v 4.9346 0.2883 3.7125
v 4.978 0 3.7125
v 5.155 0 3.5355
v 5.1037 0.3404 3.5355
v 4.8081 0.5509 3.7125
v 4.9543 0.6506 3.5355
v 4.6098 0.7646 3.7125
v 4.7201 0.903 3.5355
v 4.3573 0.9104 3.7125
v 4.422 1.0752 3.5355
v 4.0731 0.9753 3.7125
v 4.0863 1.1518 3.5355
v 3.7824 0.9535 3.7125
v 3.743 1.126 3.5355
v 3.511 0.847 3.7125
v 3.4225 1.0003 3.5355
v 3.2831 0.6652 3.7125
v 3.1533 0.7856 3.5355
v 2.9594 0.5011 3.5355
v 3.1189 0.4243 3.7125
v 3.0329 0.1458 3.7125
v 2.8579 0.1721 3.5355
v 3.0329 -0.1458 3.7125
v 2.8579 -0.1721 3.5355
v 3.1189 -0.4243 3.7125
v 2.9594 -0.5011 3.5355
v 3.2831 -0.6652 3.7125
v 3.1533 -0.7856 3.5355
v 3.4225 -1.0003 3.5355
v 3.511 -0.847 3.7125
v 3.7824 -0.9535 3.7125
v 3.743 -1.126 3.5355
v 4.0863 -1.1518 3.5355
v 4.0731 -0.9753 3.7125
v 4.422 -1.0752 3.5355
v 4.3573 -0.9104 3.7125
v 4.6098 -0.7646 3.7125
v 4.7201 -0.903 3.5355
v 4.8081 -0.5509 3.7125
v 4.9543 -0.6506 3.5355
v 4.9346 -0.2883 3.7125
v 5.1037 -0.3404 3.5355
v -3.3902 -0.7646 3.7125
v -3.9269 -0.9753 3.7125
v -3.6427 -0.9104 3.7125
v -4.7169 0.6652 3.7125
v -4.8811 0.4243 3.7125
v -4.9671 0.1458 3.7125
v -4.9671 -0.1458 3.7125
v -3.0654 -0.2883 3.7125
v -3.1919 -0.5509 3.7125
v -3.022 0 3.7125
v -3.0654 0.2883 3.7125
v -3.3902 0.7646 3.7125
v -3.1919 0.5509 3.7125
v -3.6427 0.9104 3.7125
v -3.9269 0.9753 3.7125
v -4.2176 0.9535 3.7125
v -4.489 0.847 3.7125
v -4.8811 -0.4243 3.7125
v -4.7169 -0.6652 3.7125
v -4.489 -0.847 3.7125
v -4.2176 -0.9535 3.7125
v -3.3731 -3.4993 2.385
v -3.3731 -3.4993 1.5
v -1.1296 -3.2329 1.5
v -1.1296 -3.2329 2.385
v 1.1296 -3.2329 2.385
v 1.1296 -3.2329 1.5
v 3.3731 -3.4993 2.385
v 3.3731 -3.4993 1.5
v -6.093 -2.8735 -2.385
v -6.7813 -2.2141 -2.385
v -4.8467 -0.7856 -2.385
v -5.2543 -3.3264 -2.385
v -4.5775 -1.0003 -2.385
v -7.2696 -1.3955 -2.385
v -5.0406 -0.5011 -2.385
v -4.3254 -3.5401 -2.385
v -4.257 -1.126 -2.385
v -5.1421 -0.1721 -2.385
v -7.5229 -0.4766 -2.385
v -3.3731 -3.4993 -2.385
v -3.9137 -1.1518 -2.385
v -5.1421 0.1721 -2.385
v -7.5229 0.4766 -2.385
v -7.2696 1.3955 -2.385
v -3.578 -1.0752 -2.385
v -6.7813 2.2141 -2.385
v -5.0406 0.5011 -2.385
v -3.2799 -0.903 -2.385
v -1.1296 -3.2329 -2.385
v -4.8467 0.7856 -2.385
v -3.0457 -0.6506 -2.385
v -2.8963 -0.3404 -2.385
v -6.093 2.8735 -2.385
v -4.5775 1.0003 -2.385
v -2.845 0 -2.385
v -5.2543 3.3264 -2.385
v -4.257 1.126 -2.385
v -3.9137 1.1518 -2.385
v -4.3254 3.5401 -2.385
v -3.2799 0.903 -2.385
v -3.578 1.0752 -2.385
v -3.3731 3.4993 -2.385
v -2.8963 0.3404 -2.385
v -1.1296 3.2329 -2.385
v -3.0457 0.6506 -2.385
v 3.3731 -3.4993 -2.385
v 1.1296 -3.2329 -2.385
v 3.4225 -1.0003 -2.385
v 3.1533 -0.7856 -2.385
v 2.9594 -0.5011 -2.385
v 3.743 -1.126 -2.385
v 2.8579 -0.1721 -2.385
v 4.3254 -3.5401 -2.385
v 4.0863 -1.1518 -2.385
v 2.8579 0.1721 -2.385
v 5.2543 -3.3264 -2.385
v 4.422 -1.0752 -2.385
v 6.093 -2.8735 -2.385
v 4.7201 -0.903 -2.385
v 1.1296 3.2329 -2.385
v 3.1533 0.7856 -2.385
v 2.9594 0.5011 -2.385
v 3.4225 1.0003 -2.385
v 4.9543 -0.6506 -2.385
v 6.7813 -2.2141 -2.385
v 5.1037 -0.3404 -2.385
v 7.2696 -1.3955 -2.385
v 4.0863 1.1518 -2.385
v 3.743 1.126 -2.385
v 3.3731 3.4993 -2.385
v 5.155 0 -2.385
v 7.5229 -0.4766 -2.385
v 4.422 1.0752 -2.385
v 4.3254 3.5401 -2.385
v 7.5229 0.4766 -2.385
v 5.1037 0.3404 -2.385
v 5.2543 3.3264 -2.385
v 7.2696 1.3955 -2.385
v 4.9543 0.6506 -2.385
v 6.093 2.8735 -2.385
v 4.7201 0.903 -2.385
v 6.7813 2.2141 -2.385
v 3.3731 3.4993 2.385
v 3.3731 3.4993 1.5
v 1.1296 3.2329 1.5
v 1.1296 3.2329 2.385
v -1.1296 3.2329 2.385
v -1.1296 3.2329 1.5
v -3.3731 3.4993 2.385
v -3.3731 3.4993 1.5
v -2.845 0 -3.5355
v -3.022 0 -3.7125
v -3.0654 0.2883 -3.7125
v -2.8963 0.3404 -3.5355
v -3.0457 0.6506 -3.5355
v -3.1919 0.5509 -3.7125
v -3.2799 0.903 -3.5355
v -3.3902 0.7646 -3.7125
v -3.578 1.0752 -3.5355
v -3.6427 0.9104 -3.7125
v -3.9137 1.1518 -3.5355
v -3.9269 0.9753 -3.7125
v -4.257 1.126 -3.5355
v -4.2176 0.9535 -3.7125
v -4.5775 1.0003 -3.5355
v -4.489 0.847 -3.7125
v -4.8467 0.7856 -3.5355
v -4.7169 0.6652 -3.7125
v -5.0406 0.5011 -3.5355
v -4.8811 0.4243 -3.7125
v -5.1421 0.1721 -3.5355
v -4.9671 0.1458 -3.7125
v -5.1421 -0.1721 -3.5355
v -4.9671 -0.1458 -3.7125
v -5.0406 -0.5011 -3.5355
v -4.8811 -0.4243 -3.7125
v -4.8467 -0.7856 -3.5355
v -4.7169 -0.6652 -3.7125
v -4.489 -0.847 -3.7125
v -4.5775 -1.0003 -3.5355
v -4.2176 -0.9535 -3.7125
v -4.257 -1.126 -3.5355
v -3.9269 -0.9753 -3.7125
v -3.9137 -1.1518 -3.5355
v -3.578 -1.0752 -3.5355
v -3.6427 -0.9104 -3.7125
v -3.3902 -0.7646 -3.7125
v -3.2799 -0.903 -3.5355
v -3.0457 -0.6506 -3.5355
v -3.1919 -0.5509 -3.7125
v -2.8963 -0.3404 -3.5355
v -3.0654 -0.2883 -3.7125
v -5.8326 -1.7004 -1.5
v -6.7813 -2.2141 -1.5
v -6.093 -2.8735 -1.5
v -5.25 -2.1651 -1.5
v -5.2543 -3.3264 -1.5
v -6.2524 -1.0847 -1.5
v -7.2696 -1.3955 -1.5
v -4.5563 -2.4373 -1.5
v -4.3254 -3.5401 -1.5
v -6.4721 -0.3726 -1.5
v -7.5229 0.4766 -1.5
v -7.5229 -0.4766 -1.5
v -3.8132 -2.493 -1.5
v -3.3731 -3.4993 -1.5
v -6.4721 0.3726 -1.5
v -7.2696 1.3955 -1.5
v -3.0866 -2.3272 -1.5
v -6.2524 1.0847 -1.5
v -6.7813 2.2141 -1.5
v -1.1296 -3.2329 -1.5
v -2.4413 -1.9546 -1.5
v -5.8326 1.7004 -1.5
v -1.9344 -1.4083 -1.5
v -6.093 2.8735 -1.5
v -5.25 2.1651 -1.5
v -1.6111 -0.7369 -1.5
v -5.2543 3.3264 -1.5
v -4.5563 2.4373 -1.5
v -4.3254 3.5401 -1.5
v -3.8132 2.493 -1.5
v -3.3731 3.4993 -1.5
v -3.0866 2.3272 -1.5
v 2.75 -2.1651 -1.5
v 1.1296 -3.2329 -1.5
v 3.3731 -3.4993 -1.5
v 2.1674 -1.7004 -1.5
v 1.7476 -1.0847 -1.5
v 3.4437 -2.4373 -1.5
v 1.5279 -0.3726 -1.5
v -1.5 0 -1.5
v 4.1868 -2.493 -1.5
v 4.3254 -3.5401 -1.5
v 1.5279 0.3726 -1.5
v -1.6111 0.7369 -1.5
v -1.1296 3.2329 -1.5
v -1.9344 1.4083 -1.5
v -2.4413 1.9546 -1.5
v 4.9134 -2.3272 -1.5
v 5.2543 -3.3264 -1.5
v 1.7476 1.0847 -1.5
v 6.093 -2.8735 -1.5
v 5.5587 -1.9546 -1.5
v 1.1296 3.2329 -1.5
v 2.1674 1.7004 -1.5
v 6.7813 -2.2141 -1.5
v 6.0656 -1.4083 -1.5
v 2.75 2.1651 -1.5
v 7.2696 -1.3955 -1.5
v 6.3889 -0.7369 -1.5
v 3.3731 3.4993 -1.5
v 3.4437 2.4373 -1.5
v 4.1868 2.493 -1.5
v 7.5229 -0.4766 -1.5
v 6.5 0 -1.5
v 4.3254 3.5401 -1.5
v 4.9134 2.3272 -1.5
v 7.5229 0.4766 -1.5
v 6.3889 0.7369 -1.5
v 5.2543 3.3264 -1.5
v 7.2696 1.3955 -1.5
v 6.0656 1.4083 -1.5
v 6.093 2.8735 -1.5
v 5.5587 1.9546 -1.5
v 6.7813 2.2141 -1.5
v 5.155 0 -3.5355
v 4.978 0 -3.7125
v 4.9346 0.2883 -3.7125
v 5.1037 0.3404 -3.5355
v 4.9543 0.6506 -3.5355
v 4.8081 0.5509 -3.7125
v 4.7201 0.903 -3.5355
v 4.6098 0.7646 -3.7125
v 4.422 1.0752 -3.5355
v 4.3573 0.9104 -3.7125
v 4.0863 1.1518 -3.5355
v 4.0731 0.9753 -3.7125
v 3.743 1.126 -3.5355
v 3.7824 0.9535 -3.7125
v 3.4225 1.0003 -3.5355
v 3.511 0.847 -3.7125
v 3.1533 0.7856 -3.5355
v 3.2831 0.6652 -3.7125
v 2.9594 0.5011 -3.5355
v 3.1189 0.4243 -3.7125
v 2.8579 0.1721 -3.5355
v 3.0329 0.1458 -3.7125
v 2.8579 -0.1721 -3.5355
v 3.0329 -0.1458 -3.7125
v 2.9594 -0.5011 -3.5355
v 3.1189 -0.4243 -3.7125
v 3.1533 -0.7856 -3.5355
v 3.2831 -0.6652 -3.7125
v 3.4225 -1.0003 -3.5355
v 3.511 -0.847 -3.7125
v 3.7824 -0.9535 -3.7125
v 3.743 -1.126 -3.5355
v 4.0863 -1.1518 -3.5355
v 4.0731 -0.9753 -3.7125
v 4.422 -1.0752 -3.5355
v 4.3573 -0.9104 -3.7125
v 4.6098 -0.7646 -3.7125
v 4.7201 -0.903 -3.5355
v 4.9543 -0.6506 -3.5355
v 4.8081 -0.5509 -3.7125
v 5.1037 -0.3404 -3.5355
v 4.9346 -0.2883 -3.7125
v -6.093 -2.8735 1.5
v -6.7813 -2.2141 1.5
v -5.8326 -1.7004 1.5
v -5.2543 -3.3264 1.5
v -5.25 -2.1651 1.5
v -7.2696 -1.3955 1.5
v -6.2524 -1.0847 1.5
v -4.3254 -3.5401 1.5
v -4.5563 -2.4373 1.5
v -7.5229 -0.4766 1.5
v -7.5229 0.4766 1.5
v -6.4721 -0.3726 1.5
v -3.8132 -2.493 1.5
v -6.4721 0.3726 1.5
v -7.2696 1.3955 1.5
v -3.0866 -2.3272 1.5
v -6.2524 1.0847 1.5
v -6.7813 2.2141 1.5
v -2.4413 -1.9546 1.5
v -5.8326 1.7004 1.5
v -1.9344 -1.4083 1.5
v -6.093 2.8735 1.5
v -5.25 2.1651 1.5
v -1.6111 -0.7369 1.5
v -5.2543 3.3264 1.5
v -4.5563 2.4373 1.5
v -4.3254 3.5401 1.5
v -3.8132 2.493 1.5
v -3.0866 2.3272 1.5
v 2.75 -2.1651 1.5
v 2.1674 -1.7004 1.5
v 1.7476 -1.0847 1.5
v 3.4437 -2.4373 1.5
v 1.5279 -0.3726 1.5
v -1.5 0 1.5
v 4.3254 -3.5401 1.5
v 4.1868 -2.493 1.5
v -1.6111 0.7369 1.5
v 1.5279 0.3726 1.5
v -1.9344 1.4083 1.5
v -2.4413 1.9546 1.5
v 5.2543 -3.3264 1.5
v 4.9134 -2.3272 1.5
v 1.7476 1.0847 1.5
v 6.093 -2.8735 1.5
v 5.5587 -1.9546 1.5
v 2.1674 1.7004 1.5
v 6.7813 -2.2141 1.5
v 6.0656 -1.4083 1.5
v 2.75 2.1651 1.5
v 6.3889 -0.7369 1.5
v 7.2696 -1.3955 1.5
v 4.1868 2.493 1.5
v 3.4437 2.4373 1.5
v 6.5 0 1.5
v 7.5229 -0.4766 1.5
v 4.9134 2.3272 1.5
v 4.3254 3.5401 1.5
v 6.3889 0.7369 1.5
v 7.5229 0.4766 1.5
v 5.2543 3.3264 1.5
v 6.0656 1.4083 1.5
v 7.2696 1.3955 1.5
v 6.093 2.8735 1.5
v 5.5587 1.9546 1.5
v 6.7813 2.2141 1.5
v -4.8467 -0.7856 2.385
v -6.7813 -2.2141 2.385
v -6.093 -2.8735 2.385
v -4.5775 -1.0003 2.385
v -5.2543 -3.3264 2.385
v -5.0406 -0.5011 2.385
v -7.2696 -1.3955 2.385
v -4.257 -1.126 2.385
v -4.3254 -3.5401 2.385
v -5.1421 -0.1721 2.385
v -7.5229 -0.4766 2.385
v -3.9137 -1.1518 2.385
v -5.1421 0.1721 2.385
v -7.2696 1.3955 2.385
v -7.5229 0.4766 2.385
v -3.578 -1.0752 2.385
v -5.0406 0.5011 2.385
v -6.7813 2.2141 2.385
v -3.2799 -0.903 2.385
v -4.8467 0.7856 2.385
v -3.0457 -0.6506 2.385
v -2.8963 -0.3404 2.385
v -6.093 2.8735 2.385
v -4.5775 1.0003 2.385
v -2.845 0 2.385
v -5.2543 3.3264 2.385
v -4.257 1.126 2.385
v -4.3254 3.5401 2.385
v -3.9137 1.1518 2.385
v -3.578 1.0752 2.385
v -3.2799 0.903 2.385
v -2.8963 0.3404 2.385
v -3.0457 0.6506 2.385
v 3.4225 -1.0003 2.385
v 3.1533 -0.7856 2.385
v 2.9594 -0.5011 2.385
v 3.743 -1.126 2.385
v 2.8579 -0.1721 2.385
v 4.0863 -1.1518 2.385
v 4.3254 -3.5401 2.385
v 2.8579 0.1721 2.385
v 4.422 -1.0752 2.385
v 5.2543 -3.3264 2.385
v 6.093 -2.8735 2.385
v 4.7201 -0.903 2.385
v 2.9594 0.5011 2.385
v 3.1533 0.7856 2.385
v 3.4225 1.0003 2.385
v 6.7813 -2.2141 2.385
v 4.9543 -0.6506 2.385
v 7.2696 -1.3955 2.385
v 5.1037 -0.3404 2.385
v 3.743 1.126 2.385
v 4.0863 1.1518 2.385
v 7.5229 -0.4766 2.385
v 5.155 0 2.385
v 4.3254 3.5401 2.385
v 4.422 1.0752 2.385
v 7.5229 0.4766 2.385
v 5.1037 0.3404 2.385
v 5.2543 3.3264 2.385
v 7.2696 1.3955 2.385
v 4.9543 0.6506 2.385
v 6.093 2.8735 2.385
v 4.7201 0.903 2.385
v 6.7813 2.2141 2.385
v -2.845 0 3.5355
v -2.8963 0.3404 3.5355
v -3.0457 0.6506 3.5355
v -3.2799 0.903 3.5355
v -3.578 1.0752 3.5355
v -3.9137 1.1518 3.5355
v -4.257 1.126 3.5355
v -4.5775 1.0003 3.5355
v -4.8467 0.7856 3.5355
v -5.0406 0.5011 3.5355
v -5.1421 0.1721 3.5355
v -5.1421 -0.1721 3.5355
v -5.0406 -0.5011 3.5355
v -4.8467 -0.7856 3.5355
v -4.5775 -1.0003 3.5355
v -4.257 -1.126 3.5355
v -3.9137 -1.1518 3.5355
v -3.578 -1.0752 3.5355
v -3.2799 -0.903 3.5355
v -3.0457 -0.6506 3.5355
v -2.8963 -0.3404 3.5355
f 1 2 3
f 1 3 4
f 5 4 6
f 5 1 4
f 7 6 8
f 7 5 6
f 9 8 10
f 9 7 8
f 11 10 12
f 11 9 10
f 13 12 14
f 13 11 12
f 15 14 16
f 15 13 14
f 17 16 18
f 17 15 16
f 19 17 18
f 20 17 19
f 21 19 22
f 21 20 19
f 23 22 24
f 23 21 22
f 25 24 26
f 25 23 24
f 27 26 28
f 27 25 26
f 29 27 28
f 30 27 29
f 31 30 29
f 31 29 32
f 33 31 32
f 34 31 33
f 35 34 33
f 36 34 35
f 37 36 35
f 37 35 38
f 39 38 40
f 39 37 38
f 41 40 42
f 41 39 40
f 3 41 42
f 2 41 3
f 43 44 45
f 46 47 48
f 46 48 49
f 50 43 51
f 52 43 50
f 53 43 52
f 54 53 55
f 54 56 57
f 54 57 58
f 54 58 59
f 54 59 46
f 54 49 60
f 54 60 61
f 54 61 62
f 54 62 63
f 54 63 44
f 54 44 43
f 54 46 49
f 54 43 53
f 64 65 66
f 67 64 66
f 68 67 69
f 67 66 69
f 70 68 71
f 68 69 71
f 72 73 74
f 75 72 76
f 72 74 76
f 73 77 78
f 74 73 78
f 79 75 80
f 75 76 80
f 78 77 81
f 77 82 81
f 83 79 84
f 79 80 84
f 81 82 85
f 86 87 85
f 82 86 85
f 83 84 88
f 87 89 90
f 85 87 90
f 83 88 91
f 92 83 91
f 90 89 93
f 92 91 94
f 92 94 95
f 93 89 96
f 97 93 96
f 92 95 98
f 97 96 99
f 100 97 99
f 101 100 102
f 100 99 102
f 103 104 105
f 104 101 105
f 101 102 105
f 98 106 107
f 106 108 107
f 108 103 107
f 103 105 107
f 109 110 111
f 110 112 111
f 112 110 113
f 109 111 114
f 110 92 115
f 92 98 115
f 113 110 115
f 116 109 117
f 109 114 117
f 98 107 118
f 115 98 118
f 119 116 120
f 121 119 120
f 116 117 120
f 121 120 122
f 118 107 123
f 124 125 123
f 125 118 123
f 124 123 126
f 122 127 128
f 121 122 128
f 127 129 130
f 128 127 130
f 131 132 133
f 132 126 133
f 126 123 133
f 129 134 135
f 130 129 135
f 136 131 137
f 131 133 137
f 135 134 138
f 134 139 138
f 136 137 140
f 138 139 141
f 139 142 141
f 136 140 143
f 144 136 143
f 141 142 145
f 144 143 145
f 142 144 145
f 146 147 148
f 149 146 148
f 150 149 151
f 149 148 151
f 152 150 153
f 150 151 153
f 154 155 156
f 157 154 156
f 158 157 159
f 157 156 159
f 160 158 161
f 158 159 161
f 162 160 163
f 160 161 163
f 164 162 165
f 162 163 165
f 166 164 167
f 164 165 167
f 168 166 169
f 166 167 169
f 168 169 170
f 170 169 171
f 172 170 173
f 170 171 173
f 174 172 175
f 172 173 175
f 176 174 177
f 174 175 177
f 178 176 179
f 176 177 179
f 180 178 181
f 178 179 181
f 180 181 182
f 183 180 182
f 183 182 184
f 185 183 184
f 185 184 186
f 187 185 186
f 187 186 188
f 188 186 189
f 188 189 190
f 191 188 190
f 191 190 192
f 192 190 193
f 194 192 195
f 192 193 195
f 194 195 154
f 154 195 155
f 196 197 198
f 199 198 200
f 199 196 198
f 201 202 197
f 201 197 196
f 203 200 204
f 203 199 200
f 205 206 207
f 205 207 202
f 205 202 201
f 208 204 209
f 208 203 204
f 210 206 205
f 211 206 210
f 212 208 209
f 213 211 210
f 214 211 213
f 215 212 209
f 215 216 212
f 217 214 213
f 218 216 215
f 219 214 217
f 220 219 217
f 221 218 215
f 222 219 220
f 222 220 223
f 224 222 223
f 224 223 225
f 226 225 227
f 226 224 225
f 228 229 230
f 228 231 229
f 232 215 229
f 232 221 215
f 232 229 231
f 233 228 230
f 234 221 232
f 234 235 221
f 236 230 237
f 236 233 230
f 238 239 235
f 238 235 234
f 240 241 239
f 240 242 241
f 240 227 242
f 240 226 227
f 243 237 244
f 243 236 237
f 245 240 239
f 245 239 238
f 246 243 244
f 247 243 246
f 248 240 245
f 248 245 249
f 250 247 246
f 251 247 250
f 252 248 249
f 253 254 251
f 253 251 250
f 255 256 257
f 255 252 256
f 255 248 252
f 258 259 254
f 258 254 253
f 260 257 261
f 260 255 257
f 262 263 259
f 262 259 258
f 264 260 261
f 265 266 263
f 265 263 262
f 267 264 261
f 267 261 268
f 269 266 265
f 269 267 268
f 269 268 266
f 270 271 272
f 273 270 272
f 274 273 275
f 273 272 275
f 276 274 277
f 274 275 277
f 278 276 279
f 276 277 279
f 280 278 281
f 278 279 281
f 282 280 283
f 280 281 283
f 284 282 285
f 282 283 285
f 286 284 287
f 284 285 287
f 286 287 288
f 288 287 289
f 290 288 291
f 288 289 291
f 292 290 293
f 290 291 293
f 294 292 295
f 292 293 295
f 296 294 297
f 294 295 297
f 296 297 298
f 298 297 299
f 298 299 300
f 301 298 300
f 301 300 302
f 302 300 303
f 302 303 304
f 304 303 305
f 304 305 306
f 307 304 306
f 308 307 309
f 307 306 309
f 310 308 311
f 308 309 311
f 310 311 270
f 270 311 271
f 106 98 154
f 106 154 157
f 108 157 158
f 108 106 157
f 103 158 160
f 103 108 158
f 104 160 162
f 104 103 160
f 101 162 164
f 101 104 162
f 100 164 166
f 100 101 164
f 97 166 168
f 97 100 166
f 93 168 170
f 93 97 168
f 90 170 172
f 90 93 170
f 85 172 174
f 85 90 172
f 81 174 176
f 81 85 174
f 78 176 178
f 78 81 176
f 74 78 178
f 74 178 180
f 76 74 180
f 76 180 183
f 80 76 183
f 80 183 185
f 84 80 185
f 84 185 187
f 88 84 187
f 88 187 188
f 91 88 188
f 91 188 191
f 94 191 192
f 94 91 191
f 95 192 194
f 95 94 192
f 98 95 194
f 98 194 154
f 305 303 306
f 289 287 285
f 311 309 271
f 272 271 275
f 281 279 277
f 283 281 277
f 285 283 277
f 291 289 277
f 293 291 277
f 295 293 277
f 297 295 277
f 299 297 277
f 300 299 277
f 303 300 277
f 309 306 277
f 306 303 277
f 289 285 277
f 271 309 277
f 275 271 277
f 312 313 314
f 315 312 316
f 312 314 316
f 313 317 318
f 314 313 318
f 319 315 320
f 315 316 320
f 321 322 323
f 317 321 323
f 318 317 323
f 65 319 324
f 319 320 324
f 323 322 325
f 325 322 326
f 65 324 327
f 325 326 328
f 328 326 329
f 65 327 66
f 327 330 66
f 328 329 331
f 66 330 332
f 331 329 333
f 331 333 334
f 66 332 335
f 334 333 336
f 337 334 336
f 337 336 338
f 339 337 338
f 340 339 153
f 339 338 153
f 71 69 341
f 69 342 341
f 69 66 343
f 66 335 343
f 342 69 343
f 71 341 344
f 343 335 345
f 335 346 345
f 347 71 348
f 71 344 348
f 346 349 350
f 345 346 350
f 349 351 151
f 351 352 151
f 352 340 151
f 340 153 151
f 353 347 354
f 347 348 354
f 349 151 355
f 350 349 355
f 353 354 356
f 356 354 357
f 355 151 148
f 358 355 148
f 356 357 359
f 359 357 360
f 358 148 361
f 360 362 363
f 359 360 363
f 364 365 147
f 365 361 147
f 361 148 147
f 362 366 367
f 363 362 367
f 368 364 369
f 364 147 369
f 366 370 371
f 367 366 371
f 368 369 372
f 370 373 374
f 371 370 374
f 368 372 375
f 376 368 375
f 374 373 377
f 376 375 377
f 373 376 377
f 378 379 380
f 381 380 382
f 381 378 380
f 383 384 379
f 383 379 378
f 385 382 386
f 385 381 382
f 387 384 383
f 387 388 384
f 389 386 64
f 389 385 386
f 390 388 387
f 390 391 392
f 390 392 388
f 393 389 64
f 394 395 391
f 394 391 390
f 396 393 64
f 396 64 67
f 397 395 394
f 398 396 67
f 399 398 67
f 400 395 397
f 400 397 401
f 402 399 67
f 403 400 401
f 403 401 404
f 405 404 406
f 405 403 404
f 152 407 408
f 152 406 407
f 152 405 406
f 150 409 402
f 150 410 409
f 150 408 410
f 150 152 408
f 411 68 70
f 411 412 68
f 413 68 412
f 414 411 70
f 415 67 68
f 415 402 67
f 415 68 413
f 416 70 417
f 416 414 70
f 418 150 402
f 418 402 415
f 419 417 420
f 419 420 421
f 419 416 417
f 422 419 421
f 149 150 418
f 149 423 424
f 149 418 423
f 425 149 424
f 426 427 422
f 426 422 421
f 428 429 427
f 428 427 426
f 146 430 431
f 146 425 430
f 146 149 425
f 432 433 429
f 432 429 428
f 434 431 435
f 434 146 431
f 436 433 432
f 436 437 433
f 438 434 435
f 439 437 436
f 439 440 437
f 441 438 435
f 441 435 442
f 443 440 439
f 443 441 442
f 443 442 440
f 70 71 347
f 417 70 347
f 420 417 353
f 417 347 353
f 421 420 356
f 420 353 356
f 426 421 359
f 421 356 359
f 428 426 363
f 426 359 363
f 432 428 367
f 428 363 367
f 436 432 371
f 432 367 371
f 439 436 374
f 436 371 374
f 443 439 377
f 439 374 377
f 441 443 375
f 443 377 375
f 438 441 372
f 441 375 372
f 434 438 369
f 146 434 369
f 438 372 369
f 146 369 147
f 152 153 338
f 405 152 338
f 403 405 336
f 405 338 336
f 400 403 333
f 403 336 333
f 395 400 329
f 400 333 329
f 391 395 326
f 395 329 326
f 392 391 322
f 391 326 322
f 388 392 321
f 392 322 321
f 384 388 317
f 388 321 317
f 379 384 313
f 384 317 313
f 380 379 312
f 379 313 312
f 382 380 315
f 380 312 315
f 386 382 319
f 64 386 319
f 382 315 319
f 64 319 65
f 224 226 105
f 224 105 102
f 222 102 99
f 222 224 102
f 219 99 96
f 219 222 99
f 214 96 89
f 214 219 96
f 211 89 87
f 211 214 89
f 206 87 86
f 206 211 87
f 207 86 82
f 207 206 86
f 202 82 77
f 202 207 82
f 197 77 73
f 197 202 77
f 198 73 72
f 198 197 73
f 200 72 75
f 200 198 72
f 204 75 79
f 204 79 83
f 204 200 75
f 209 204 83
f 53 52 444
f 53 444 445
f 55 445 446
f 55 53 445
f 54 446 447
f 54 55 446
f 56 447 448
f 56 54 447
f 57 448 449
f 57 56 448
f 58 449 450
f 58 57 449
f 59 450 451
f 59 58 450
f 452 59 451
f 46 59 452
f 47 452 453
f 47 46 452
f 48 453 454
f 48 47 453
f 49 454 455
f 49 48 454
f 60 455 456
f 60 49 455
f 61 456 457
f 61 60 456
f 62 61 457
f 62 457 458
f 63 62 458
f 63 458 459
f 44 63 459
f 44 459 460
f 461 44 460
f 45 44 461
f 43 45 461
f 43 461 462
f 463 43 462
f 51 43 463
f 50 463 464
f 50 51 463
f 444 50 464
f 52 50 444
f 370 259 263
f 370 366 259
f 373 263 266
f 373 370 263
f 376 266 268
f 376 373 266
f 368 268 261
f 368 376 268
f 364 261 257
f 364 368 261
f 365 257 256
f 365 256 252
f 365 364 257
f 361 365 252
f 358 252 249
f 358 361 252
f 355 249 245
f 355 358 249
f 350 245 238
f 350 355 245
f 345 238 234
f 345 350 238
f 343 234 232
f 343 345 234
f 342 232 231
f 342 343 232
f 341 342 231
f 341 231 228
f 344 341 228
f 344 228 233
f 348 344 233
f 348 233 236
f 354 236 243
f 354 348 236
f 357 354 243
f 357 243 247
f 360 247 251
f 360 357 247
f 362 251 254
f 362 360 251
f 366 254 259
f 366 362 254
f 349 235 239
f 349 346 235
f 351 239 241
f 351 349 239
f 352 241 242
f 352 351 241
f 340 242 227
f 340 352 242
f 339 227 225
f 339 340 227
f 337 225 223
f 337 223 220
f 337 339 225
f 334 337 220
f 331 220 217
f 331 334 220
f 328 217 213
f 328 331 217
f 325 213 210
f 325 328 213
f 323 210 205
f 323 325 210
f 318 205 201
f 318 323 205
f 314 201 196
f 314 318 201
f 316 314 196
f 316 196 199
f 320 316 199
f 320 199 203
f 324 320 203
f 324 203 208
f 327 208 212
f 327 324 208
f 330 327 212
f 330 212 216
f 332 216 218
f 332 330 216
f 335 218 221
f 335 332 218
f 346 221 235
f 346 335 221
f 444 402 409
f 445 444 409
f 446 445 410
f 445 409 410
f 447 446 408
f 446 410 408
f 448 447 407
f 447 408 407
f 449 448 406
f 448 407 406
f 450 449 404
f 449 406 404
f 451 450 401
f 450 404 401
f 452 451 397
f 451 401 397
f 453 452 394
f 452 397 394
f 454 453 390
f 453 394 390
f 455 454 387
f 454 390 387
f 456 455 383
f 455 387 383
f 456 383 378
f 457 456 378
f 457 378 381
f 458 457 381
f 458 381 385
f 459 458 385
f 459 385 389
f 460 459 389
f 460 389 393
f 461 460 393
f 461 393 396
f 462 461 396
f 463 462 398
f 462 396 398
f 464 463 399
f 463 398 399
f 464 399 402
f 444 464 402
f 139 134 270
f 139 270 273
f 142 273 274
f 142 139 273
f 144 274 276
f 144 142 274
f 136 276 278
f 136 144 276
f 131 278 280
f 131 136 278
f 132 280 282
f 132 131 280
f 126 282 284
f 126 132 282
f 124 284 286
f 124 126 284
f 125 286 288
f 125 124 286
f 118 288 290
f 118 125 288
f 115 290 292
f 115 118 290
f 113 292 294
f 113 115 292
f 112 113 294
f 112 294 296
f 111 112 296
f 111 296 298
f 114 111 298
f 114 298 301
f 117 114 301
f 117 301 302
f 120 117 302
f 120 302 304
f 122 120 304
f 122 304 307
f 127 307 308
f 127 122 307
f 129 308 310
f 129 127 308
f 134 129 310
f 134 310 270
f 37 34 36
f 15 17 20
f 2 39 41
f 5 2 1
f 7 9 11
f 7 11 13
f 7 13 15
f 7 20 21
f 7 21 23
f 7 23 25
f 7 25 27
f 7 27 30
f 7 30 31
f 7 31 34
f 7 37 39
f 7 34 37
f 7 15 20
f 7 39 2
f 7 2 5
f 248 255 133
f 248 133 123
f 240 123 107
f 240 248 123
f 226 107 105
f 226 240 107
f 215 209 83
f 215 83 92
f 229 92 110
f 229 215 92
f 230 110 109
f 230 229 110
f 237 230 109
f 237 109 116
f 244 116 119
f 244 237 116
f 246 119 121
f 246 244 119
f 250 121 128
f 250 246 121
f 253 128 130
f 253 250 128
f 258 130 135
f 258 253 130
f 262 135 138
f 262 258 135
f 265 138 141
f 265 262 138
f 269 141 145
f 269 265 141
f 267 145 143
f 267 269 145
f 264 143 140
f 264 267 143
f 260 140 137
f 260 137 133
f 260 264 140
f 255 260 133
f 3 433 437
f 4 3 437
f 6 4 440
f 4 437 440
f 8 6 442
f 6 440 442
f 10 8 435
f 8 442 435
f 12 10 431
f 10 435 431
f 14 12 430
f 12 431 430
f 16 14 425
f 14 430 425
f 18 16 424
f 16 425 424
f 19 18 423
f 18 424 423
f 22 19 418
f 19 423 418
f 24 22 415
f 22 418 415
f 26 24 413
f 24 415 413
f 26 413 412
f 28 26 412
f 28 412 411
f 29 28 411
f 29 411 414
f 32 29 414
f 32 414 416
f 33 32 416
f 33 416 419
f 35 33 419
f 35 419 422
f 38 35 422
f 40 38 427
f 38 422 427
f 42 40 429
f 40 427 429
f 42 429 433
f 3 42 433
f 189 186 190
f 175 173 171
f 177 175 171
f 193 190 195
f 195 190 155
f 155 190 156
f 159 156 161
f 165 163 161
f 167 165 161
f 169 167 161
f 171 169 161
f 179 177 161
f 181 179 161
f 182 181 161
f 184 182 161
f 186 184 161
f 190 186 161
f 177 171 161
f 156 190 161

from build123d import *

# Parameters (mm, degrees)
SKETCH_2_R                 = 2.5
EXTRUDE_1_DEPTH            = 1.5
EXTRUDE_1_2_DEPTH          = 1.5
EXTRUDE_2_DEPTH            = 0.885
SKETCH_4_R                 = 1.155
EXTRUDE_3_DEPTH            = 1.3275
CHAMFER_1_SIZE             = 0.177
CHAMFER_1_OF_MIRROR_1_SIZE = 0.177


with BuildPart() as part:
    # 草图2 → 拉伸1 (new, symmetric)
    with BuildSketch(Plane.XY):
        with Locations((4, 0)):
            Circle(SKETCH_2_R)
    extrude(amount=EXTRUDE_1_DEPTH, both=True)



with BuildPart() as body_2:
    # 草图2 → Extrude 1 2 (new, symmetric)
    with BuildSketch(Plane.XY):
        with Locations((-4, 0)):
            Circle(SKETCH_2_R)
    extrude(amount=EXTRUDE_1_2_DEPTH, both=True)


with BuildPart() as part_1:
    add(part.part)

    add(body_2.part)  # 拉伸2 merges body 2
    # 草图3 → 拉伸2 (add)
    with BuildSketch(Plane.XY.offset(1.5)):
        with BuildLine():
            ThreePointArc((-3.373050874, 3.499279896), (-7.555, 0), (-3.373050874, -3.499279896))
            ThreePointArc((-3.373050874, -3.499279896), (0, -3.1995), (3.373050874, -3.499279896))
            ThreePointArc((3.373050874, -3.499279896), (7.555, 0), (3.373050874, 3.499279896))
            ThreePointArc((3.373050874, 3.499279896), (0, 3.1995), (-3.373050874, 3.499279896))
        make_face()
    extrude_2 = extrude(amount=EXTRUDE_2_DEPTH)

    # 草图4 → 拉伸3 (add)
    with BuildSketch(Plane.XY.offset(2.385)):
        with Locations((4, 0)):
            Circle(SKETCH_4_R)
        with Locations((-4, 0)):
            Circle(SKETCH_4_R)
    extrude_3 = extrude(amount=EXTRUDE_3_DEPTH)

    # 倒角1
    chamfer_1_edges = [part_1.edges().sort_by_distance(p)[0] for p in [
        (2.845, 0, 3.7125),
        (-5.155, 0, 3.7125),
    ]]
    chamfer(chamfer_1_edges, length=CHAMFER_1_SIZE)

    # 镜向1: 拉伸2, 拉伸3 across plane
    add(extrude_2.mirror(Plane.XY))
    add(extrude_3.mirror(Plane.XY))

    # 倒角1 of 镜向1
    chamfer_1_of_mirror_1_edges = [part_1.edges().sort_by_distance(p)[0] for p in [
        (2.845, 0, -3.7125),
        (-5.155, 0, -3.7125),
    ]]
    chamfer(chamfer_1_of_mirror_1_edges, length=CHAMFER_1_OF_MIRROR_1_SIZE)


solid = part_1.part
